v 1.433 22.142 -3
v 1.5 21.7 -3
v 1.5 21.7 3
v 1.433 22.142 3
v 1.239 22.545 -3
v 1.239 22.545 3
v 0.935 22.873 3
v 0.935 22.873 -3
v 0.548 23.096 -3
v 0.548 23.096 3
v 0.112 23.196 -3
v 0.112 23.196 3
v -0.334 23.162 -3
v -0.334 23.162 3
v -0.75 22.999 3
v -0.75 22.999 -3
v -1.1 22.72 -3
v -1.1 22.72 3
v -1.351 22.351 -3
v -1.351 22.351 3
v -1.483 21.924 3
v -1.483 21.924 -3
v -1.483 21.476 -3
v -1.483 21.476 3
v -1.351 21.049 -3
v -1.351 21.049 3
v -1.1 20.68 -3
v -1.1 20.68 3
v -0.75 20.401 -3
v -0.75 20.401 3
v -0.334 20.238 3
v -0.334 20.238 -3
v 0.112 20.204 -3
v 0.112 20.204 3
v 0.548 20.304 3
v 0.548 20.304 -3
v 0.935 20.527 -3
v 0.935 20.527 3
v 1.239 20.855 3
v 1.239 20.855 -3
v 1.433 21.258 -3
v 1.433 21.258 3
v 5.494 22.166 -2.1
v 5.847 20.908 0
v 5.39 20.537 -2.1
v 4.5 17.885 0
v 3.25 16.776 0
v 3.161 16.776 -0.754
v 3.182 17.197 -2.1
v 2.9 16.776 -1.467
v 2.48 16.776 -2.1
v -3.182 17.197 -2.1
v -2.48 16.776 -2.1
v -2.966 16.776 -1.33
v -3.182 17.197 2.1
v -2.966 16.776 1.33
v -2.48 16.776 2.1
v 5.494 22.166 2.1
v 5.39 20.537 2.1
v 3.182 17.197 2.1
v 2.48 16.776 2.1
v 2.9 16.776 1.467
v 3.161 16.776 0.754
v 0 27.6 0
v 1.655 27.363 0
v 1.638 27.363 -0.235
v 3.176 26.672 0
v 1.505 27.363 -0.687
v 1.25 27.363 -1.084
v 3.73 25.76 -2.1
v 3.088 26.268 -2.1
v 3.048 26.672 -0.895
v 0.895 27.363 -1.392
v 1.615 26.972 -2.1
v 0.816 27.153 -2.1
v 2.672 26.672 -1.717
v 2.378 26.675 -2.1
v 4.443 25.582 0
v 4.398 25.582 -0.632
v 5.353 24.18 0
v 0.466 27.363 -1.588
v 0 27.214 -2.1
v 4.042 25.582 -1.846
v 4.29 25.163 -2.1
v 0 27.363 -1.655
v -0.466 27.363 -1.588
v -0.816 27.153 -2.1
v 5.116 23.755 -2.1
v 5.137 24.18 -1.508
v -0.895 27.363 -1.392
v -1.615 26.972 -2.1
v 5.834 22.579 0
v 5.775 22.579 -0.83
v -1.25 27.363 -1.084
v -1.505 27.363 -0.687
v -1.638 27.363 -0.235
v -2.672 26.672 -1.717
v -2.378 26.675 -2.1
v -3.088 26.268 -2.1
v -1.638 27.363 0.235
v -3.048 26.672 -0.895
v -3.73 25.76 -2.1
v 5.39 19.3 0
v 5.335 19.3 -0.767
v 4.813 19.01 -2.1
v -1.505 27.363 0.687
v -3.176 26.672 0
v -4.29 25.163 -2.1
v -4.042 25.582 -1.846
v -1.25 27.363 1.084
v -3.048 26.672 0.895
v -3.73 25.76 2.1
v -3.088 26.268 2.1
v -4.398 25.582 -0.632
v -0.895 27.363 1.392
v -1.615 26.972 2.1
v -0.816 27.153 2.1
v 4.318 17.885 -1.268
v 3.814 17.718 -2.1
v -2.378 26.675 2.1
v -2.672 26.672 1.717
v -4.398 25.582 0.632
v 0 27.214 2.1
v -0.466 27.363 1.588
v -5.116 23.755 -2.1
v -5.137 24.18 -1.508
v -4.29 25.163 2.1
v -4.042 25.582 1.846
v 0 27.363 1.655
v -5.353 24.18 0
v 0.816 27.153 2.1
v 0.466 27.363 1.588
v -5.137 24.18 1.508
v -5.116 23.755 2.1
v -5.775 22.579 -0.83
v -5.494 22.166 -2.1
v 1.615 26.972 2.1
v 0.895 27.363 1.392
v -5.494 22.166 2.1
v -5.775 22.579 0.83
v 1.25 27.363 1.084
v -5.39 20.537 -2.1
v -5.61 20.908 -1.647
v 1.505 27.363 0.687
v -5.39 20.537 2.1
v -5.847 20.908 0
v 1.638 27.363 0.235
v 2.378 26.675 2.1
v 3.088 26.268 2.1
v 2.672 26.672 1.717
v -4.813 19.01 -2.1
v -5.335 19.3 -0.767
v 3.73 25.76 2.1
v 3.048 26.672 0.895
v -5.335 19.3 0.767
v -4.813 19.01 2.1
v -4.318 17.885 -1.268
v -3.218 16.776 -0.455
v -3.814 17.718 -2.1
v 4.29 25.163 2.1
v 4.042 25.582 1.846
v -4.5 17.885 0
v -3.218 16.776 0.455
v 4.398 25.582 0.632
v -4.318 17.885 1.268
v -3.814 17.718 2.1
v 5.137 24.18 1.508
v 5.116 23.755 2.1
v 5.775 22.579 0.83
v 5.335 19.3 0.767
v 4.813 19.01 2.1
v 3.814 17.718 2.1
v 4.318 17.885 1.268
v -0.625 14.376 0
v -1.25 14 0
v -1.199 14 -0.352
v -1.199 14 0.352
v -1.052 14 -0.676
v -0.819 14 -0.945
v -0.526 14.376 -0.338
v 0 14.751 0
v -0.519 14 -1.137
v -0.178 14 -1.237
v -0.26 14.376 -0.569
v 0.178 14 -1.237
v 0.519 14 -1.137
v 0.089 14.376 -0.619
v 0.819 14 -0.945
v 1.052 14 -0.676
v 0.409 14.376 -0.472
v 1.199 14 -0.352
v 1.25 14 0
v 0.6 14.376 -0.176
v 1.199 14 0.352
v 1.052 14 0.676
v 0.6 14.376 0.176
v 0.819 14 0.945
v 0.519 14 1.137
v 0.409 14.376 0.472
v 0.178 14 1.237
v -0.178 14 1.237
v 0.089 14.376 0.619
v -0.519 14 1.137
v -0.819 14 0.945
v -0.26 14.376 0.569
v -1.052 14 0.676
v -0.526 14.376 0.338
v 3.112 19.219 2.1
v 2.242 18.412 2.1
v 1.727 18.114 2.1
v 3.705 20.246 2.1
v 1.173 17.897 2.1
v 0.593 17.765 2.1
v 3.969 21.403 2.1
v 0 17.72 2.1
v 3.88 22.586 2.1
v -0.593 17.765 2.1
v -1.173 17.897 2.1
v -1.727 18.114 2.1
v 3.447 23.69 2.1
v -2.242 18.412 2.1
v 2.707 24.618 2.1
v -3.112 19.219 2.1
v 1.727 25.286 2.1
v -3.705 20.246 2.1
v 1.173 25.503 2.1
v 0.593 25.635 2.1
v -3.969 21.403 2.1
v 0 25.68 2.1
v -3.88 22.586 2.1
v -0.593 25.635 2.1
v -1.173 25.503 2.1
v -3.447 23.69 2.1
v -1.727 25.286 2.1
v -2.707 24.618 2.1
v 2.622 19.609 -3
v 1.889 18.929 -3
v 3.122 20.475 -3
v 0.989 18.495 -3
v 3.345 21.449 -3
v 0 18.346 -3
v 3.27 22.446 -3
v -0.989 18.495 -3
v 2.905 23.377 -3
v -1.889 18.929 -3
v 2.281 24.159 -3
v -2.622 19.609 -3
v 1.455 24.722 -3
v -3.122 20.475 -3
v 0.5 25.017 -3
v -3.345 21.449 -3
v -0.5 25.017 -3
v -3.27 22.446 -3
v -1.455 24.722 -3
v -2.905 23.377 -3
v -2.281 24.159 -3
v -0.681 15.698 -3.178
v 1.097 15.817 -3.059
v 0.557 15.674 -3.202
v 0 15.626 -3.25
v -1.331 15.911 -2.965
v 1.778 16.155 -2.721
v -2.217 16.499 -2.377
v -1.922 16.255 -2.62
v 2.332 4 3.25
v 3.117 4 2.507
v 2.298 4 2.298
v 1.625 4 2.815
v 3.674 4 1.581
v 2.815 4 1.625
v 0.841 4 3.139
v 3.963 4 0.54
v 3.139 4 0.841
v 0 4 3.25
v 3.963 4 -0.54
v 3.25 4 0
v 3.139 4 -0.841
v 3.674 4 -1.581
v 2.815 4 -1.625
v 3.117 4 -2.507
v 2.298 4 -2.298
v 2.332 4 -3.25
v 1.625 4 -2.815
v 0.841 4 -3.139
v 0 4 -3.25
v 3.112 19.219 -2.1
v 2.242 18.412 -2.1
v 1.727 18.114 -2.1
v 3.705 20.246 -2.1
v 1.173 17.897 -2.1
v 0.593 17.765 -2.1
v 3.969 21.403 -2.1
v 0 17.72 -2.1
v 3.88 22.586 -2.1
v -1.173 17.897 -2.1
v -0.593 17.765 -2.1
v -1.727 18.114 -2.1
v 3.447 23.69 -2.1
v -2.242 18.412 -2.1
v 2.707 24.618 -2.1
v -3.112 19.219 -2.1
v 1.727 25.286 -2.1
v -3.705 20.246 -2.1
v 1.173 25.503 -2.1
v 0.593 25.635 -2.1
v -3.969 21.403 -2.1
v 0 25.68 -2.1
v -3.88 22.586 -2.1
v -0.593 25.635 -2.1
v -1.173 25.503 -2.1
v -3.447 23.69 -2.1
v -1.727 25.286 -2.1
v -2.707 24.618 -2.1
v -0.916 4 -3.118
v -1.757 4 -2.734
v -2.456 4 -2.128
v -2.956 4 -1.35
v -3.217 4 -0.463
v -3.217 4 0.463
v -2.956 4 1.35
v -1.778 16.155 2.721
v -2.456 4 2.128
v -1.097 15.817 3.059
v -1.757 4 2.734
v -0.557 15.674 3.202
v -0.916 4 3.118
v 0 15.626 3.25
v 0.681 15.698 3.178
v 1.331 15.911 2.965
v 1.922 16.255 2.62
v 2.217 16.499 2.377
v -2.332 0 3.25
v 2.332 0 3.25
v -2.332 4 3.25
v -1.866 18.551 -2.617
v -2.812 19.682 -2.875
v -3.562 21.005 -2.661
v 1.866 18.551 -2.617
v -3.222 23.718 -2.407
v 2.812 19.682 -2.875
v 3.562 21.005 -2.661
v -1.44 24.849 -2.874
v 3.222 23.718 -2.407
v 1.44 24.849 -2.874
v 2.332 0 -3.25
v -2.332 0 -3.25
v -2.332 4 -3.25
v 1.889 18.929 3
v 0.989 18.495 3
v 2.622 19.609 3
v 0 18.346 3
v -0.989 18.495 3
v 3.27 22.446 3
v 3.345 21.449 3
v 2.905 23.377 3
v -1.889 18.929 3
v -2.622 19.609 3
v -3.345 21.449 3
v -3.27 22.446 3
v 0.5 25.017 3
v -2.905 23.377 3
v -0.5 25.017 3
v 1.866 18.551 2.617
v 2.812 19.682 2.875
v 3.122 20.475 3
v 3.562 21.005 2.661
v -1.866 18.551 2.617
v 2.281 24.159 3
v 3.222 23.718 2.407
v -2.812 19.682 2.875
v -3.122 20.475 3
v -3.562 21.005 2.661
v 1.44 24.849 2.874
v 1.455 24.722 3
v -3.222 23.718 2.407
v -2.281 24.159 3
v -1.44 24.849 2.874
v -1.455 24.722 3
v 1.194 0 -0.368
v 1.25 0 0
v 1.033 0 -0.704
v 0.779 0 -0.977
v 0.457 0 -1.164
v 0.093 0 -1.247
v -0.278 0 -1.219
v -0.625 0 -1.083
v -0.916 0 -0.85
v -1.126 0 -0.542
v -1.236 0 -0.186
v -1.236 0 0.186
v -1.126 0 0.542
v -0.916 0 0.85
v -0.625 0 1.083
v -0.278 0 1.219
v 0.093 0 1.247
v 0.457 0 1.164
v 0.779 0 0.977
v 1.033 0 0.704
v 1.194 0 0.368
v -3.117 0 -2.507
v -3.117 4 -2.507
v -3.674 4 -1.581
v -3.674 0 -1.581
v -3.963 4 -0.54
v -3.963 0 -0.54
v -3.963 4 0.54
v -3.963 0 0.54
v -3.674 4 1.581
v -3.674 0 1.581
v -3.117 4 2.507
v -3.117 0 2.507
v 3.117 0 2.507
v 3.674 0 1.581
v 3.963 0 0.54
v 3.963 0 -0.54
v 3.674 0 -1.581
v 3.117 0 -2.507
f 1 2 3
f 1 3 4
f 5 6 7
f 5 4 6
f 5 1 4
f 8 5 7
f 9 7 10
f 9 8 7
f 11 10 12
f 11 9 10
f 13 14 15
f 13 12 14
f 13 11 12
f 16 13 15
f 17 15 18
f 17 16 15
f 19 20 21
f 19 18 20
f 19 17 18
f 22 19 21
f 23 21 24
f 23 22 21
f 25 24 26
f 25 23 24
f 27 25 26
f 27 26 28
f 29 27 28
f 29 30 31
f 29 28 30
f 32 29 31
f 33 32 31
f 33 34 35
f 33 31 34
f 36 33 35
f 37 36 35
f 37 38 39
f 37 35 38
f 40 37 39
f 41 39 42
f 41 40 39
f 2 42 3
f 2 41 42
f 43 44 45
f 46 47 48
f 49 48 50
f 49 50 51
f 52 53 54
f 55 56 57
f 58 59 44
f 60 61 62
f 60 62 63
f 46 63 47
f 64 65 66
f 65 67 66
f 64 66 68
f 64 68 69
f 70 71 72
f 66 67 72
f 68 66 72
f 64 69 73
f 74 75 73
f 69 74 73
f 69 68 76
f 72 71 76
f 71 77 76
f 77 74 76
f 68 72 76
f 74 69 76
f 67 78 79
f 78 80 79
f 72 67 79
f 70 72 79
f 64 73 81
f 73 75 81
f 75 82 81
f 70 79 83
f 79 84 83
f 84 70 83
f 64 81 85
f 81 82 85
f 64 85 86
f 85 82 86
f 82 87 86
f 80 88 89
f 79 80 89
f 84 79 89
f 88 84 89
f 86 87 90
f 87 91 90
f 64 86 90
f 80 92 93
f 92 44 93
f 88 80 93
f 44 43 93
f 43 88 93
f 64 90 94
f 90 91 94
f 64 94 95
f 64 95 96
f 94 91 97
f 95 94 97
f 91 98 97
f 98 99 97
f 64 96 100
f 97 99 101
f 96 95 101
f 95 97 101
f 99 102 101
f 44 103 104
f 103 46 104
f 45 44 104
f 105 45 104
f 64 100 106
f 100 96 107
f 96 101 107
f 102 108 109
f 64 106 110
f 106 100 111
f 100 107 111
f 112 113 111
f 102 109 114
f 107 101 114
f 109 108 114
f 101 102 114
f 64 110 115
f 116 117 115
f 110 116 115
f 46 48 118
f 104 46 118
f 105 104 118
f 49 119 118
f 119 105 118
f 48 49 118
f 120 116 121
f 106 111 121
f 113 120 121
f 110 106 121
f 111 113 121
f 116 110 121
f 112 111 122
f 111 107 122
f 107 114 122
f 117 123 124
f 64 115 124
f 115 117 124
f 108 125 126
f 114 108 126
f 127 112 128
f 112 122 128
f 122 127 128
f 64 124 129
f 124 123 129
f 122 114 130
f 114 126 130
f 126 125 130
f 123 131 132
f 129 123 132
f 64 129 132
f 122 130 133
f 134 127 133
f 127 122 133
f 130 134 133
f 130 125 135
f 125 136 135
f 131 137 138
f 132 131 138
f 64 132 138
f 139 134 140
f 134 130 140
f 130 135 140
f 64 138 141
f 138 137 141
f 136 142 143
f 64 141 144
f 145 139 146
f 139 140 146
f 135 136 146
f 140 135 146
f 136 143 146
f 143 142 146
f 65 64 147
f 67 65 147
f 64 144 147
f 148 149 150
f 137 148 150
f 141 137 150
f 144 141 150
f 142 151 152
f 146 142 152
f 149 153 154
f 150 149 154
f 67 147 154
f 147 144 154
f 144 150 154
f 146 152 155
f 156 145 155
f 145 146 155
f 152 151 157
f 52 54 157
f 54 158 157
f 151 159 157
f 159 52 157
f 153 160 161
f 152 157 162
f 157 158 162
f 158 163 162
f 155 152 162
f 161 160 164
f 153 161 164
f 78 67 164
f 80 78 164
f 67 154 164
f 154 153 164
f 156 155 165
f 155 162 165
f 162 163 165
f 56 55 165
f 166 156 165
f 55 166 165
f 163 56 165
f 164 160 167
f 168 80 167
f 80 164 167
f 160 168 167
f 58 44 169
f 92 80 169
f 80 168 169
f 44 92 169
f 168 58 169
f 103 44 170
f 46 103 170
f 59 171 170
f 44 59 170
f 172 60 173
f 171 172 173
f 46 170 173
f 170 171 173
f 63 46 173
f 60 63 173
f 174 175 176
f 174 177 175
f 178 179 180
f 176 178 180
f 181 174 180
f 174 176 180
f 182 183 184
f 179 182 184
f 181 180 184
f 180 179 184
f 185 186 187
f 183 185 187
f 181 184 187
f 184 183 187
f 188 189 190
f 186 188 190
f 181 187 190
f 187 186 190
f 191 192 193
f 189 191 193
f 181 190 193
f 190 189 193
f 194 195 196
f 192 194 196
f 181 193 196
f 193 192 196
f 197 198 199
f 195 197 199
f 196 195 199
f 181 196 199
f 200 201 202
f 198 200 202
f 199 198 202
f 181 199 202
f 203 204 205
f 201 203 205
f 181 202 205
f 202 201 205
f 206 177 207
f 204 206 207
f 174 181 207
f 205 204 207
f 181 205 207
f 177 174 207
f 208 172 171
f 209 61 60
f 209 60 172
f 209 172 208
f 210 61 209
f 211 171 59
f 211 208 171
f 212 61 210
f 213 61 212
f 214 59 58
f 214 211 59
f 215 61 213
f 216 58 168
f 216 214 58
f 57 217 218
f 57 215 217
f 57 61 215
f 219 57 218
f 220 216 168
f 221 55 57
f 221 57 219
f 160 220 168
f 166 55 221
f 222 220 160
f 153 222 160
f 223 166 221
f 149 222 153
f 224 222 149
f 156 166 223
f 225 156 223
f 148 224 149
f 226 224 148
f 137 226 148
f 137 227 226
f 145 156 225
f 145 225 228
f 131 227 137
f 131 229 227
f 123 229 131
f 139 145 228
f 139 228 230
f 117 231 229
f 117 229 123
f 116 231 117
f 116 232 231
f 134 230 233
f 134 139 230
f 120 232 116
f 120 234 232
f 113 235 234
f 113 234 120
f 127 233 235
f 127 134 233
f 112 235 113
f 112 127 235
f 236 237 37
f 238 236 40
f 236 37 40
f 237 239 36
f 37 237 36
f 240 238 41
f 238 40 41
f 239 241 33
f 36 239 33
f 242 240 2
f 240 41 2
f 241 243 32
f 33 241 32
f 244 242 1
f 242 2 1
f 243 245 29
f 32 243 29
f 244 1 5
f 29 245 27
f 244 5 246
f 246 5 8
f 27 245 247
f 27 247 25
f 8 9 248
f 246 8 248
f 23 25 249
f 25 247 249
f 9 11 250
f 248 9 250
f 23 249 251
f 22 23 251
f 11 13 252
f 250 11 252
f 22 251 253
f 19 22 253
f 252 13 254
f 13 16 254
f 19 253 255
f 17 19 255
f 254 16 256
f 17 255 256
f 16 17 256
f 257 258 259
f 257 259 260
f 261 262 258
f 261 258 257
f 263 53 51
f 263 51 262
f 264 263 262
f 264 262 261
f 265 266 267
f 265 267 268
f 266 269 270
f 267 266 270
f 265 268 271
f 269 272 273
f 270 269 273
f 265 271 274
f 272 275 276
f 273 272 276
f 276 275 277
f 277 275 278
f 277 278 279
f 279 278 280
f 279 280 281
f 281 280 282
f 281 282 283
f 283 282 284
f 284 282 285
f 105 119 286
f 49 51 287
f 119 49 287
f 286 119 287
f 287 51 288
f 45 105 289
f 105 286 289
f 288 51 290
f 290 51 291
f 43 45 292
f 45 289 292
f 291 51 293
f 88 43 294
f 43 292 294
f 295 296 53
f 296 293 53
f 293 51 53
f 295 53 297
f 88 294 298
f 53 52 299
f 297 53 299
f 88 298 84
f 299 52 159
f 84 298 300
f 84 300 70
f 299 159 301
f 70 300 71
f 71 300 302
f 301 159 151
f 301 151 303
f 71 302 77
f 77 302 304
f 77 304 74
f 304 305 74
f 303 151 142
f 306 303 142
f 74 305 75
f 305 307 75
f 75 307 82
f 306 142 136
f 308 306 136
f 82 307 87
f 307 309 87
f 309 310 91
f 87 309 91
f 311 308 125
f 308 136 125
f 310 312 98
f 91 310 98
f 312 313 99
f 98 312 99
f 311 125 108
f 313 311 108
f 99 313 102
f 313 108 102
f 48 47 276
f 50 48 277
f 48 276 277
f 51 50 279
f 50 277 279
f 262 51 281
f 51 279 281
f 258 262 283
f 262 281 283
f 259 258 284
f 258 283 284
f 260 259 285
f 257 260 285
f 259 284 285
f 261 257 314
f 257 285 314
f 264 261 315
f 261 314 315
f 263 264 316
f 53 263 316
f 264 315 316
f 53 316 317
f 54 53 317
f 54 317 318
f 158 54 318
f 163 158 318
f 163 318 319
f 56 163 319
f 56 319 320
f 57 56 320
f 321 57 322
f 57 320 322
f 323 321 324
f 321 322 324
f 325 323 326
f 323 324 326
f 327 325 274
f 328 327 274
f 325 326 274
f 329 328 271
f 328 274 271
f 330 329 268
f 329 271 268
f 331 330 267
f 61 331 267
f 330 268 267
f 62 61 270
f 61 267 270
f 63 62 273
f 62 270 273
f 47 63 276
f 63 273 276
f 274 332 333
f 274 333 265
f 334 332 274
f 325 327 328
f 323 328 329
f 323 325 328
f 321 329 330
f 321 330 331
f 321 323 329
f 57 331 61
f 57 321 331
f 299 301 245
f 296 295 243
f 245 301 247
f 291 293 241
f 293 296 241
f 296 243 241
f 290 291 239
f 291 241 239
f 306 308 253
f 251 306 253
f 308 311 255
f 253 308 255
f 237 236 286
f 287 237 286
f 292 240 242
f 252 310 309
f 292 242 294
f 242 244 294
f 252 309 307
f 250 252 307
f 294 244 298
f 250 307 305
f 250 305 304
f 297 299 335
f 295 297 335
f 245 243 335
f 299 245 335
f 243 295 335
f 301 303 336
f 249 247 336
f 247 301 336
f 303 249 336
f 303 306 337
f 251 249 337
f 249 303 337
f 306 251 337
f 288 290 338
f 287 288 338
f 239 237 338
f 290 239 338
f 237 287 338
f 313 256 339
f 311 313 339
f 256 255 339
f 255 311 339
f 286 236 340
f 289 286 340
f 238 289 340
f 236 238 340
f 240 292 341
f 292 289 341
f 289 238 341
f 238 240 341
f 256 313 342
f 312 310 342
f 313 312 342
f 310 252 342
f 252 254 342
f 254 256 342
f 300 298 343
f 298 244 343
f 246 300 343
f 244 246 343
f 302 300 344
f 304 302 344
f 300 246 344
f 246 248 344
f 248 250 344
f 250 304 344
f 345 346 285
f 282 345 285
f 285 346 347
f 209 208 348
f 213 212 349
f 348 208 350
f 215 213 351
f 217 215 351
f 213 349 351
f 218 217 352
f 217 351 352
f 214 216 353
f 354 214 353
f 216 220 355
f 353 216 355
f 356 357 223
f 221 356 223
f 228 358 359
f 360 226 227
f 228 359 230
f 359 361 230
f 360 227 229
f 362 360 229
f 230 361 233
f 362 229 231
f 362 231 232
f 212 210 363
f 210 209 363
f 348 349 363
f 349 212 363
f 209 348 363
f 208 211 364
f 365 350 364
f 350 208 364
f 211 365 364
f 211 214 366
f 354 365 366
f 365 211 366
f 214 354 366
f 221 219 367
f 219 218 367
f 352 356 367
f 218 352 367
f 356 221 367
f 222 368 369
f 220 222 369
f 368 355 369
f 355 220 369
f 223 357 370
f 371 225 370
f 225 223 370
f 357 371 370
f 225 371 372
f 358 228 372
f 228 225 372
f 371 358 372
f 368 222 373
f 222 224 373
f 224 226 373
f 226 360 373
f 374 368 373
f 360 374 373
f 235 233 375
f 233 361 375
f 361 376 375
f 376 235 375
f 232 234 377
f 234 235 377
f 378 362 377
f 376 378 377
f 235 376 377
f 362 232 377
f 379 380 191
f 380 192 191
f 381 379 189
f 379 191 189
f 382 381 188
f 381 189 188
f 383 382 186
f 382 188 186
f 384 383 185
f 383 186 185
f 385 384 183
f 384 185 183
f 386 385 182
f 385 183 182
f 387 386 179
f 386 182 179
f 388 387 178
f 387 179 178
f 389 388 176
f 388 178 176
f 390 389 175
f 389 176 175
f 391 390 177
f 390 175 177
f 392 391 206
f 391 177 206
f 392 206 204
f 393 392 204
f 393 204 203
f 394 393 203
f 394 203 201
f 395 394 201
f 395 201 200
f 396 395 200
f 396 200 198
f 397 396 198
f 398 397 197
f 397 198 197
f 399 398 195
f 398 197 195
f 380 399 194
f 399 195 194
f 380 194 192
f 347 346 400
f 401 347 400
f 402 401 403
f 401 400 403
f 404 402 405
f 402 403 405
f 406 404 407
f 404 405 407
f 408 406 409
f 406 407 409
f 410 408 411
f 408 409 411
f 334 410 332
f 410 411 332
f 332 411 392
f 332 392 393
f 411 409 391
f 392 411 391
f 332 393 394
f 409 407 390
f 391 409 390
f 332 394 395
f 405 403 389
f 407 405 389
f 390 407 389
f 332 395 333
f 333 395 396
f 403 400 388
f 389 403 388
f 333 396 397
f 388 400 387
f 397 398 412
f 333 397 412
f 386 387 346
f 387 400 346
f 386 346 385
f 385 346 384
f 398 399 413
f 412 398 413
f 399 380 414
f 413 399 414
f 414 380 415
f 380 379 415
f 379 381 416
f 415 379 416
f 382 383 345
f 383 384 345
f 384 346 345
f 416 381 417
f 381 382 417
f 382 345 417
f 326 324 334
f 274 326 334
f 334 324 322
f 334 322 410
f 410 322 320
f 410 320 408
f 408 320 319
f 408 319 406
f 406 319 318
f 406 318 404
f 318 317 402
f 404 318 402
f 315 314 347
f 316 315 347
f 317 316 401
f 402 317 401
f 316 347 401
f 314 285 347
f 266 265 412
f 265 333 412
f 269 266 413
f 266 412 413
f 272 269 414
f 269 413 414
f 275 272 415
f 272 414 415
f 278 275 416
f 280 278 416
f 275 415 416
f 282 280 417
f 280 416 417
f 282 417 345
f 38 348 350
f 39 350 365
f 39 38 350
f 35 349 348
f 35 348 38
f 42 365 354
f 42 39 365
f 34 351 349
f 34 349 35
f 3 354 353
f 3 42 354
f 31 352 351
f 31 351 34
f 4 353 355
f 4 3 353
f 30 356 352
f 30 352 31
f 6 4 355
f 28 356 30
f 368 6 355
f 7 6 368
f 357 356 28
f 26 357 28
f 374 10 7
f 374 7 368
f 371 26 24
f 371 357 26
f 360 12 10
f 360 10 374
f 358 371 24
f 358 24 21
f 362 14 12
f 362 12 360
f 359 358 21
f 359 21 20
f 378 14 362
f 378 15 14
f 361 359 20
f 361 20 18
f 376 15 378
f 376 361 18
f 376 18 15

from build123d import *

# Parameters (mm, degrees)
CORTAR_EXTRUIR1_DEPTH      = 29.833660884
CORTAR_EXTRUIR1_DEPTH_BACK = 29.833660884
CROQUIS2_W                 = 3.8
CROQUIS2_H                 = 10.824175058
CROQUIS2_W_2               = 0.75
CROQUIS2_H_2               = 4
CORTAR_EXTRUIR2_DEPTH      = 29.580062981
CORTAR_EXTRUIR2_DEPTH_BACK = 29.580062981
CROQUIS4_W                 = 1.877516853
CROQUIS4_H                 = 6.743313928
CORTAR_EXTRUIR3_DEPTH      = 29.410077437
CORTAR_EXTRUIR3_DEPTH_BACK = 29.410077437
CROQUIS5_R                 = 1.5
TALADRO_ROSCADO_M31_D      = 2.5
TALADRO_ROSCADO_M31_DEPTH  = 14
TALADRO_ROSCADO_M31_TIP    = 0.751075774


with BuildPart() as part:
    # Croquis1 → Revolución1 (revolve)
    with BuildSketch(Plane.XY):
        with BuildLine():
            Line((0, 0), (0, 17.2))
            ThreePointArc((0, 17.2), (4.5, 21.7), (0, 26.2))
            Line((0, 26.2), (0, 27.6))
            ThreePointArc((0, 27.6), (5.65078016, 23.396668376), (3.25, 16.775824942))
            Line((3.25, 16.775824942), (3.25, 4))
            Line((3.25, 4), (4, 4))
            Line((4, 4), (4, 0))
            Line((4, 0), (0, 0))
        make_face()
    revolve(axis=Axis((0, 0, 0), (0, 1, 0)))

    # Croquis2 → Cortar-Extruir1 (cut, two sides: drawn at the far end of the back side and taken through both)
    with BuildSketch(Plane(origin=(0, 0, 0), x_dir=(0, 0, -1), z_dir=(1, 0, 0)).offset(-CORTAR_EXTRUIR1_DEPTH_BACK)):
        with Locations((-4, 22.187912471)):
            Rectangle(CROQUIS2_W, CROQUIS2_H)
        with Locations((4, 22.187912471)):
            Rectangle(CROQUIS2_W, CROQUIS2_H)
        Polygon((-3.25, 15.625824942), (-2.1, 16.775824942), (-3.25, 16.775824942), align=None)
        Polygon((3.25, 16.775824942), (2.1, 16.775824942), (3.25, 15.625824942), align=None)
        with Locations((3.625, 2)):
            Rectangle(CROQUIS2_W_2, CROQUIS2_H_2)
        with Locations((-3.625, 2)):
            Rectangle(CROQUIS2_W_2, CROQUIS2_H_2)
    extrude(amount=CORTAR_EXTRUIR1_DEPTH + CORTAR_EXTRUIR1_DEPTH_BACK, mode=Mode.SUBTRACT)

    # Croquis3 → Revolución2 (revolve)
    with BuildSketch(Plane.XY):
        with BuildLine():
            Line((0, 26.2), (0, 17.2))
            ThreePointArc((0, 17.2), (-4.5, 21.7), (0, 26.2))
        make_face()
    revolve(axis=Axis((0, 26.2, 0), (0, -1, 0)))

    # Croquis4 → Cortar-Extruir2 (cut, two sides: drawn at the far end of the back side and taken through both)
    with BuildSketch(Plane(origin=(0, 0, 0), x_dir=(0, 0, -1), z_dir=(1, 0, 0)).offset(-CORTAR_EXTRUIR2_DEPTH_BACK)):
        with Locations((-3.938758427, 21.717554998)):
            Rectangle(CROQUIS4_W, CROQUIS4_H)
        with Locations((3.938758427, 21.717554998)):
            Rectangle(CROQUIS4_W, CROQUIS4_H)
    extrude(amount=CORTAR_EXTRUIR2_DEPTH + CORTAR_EXTRUIR2_DEPTH_BACK, mode=Mode.SUBTRACT)

    # Croquis5 → Cortar-Extruir3 (cut, two sides: drawn at the far end of the back side and taken through both)
    with BuildSketch(Plane.XY.offset(-CORTAR_EXTRUIR3_DEPTH_BACK)):
        with Locations((0, 21.7)):
            Circle(CROQUIS5_R)
    extrude(amount=CORTAR_EXTRUIR3_DEPTH + CORTAR_EXTRUIR3_DEPTH_BACK, mode=Mode.SUBTRACT)

    # Taladro roscado M31
    with Locations(Plane(origin=(0, 0, 0), x_dir=(-1, 0, 0), z_dir=(0, -1, 0))):
        with Locations((0, 0)):
            Hole(TALADRO_ROSCADO_M31_D / 2, depth=TALADRO_ROSCADO_M31_DEPTH)
            with Locations((0, 0, -(TALADRO_ROSCADO_M31_DEPTH + TALADRO_ROSCADO_M31_TIP / 2))):  # 118° drill point
                Cone(0, TALADRO_ROSCADO_M31_D / 2, TALADRO_ROSCADO_M31_TIP, mode=Mode.SUBTRACT)


solid = part.part
